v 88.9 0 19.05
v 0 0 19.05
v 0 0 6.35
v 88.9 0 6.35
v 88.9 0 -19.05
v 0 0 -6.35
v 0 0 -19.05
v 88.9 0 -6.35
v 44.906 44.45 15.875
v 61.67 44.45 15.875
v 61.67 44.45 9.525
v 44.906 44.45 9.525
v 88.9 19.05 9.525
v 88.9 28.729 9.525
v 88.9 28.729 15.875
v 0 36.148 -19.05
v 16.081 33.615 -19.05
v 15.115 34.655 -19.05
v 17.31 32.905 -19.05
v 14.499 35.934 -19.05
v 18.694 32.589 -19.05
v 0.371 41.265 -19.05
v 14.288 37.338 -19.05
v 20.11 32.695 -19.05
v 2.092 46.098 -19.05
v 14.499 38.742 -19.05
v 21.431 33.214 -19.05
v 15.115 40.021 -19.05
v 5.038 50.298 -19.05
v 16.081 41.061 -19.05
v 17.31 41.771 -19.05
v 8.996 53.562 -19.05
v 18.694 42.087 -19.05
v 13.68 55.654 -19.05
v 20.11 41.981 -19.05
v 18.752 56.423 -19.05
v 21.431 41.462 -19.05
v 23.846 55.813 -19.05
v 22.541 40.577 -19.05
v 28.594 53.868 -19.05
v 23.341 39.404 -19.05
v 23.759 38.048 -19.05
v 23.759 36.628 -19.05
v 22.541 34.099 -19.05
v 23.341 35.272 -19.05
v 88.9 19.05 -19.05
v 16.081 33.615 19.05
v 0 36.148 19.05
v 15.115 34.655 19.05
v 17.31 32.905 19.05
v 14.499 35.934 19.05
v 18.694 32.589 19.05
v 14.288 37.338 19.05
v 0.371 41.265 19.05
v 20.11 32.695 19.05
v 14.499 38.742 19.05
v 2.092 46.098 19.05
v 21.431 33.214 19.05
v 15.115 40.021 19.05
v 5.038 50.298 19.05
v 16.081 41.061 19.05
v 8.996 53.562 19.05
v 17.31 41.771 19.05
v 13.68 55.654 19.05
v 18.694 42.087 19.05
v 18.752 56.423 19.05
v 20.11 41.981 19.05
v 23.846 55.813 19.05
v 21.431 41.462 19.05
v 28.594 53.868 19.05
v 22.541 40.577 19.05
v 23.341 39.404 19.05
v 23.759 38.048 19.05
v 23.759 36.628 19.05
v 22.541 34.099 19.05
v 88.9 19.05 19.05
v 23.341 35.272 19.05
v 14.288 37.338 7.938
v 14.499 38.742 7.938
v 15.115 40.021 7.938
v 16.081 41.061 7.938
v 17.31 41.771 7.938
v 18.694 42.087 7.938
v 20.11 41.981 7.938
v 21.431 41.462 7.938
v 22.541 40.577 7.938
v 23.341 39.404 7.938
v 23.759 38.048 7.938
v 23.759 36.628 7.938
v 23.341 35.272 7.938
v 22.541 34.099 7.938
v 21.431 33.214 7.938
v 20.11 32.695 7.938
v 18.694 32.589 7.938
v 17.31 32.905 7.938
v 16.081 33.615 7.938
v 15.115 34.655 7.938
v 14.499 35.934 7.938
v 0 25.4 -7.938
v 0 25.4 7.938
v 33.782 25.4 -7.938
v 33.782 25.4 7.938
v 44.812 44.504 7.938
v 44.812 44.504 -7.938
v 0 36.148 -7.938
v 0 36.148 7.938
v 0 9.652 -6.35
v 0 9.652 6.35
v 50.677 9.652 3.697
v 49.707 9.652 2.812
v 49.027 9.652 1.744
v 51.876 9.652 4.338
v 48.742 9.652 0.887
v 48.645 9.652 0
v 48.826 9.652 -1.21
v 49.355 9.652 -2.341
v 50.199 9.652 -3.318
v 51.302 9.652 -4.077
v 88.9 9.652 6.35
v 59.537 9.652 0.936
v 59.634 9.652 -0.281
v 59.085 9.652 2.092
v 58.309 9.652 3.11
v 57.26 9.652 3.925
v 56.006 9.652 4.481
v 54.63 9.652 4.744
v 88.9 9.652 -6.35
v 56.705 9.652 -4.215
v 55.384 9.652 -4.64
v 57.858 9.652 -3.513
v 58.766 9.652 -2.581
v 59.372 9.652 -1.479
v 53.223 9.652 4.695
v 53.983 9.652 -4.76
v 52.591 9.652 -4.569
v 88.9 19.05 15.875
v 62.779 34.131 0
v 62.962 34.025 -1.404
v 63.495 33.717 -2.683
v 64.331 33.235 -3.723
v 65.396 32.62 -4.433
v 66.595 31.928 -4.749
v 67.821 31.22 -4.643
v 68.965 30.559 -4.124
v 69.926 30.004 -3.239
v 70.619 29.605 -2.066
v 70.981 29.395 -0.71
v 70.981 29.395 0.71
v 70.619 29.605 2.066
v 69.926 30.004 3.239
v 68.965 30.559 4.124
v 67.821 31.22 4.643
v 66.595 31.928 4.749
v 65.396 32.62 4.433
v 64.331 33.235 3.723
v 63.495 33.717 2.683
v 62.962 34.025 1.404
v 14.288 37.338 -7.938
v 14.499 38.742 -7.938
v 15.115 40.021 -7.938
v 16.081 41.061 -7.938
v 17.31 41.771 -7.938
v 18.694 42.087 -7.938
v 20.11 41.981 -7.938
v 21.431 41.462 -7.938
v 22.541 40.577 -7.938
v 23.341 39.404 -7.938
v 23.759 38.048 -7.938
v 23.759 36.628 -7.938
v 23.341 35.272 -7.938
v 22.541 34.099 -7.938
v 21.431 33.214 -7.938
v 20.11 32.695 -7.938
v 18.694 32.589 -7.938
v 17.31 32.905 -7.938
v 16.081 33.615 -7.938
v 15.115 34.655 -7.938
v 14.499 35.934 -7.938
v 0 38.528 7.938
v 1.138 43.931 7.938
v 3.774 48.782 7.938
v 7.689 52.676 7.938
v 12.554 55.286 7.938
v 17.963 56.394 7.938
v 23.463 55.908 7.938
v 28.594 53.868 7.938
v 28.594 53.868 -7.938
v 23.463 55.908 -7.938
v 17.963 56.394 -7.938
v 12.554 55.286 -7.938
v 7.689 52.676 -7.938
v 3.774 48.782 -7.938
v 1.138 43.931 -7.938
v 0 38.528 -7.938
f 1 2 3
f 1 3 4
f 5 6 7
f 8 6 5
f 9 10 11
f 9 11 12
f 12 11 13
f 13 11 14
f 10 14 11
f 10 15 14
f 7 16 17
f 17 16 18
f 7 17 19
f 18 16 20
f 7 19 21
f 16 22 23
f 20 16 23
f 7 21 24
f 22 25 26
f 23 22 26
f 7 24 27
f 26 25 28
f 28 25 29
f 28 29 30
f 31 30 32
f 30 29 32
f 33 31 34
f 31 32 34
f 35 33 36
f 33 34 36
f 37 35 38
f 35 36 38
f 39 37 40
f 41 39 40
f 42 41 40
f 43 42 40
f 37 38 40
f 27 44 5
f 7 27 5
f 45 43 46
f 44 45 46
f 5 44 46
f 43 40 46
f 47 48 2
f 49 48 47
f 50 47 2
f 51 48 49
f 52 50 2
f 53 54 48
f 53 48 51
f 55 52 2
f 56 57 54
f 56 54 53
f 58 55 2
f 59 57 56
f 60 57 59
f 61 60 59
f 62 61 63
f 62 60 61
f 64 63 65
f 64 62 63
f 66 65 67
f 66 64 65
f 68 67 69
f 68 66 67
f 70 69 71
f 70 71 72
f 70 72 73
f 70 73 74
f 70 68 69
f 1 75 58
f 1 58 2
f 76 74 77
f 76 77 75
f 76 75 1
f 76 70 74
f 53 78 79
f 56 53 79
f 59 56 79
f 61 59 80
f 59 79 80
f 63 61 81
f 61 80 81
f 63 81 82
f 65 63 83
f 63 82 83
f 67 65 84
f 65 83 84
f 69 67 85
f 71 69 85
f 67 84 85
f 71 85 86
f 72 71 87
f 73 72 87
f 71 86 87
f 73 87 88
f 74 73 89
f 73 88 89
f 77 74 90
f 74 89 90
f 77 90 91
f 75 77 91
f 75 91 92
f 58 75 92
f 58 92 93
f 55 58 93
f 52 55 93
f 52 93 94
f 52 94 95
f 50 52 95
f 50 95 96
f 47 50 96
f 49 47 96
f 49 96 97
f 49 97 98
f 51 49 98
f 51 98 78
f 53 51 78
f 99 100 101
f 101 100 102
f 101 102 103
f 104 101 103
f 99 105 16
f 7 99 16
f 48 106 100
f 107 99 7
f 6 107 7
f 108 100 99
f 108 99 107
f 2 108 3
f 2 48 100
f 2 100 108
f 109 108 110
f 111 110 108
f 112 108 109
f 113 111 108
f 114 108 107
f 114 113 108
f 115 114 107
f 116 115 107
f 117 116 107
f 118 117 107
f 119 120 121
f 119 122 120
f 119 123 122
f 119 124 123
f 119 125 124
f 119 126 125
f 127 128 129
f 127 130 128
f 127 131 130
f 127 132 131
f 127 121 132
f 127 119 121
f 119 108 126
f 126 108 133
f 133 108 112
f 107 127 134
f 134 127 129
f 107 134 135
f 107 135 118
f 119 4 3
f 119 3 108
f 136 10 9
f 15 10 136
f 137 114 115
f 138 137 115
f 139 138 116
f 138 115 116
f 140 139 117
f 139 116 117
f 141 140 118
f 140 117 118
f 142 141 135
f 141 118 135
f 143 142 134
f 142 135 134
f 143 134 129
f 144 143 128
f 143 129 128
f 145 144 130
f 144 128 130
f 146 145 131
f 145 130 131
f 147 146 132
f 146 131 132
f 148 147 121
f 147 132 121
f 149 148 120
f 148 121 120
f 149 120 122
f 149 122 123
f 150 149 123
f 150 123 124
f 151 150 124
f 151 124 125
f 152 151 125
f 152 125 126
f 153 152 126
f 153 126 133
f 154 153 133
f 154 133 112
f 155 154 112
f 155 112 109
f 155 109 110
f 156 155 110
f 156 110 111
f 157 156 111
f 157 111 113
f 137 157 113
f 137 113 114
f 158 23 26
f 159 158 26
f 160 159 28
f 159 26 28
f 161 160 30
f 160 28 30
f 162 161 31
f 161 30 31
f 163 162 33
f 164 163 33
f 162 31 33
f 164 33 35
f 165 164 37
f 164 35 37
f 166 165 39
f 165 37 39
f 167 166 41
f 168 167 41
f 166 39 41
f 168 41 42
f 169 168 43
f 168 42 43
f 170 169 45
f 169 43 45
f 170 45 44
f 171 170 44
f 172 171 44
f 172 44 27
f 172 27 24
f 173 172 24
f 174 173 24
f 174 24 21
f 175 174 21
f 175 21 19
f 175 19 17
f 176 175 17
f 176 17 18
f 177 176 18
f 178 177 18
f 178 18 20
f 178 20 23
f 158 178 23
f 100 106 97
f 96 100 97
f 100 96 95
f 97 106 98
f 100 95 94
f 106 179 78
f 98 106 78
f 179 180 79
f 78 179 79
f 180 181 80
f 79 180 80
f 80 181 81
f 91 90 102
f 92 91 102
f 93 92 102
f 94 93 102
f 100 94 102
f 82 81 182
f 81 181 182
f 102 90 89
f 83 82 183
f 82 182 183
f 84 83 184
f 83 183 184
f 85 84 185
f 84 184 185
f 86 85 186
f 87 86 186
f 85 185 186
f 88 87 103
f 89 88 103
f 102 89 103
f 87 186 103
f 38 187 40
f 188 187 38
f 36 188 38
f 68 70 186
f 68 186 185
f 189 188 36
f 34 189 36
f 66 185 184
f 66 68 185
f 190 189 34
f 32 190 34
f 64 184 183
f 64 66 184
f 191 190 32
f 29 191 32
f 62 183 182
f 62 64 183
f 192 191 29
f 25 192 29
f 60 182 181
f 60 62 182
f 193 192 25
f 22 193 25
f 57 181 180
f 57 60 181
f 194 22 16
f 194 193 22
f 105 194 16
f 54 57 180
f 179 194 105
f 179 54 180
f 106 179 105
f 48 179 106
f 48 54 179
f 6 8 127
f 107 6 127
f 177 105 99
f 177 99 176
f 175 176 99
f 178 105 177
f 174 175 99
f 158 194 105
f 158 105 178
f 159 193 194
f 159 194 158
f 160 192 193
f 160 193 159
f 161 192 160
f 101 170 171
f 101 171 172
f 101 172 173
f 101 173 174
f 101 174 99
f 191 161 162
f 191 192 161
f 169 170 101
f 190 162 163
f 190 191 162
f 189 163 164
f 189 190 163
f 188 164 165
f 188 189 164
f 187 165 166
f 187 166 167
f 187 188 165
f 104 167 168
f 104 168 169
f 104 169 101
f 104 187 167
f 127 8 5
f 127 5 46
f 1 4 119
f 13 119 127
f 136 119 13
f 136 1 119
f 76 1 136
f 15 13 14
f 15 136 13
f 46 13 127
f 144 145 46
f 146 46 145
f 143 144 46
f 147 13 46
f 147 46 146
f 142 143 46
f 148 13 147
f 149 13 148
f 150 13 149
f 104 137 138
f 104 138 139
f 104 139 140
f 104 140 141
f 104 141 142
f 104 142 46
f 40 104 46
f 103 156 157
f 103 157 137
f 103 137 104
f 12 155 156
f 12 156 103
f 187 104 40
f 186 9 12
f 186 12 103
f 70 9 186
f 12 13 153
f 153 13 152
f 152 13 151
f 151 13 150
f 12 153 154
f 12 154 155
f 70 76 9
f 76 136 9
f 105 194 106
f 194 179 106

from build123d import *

# Parameters (mm, degrees)
BOSS_EXTRUDE1_DEPTH          = 19.05
SKETCH2_W                    = 12.7
SKETCH2_H                    = 9.652
CUT_EXTRUDE1_DEPTH           = 108.035088344
BOSS_EXTRUDE2_DEPTH          = 3.175
CUT_EXTRUDE12_DEPTH          = 7.9375
F_1_2_0_375_DIAMETER_HOLE1_D = 9.525
F_1_2_0_375_DIAMETER_HOLE2_D = 9.525


with BuildPart() as part:
    # Sketch1 → Boss-Extrude1 (new, symmetric)
    with BuildSketch(Plane.XY):
        with BuildLine():
            Line((0, 36.148070179), (0, 0))
            Line((0, 0), (88.9, 0))
            Line((88.9, 0), (88.9, 19.05))
            Line((88.9, 19.05), (28.593563708, 53.867937227))
            ThreePointArc((28.593563708, 53.867937227), (8.995572876, 53.562269727), (0, 36.148070179))
        make_face()
    extrude(amount=BOSS_EXTRUDE1_DEPTH, both=True)

    # Sketch2 → Cut-Extrude1 (cut, through all)
    with BuildSketch(Plane(origin=(88.9, 0, 0), x_dir=(0, 0, -1), z_dir=(1, 0, 0))):
        with Locations((0, 4.826)):
            Rectangle(SKETCH2_W, SKETCH2_H)
    extrude(amount=-CUT_EXTRUDE1_DEPTH, mode=Mode.SUBTRACT)

    # Sketch3 → Boss-Extrude2 (add, symmetric)
    with BuildSketch(Plane.XY.offset(12.7)):
        Polygon((88.9, 28.728699913), (61.669909488, 44.45), (44.905909488, 44.45), (88.9, 19.05), align=None)
    extrude(amount=BOSS_EXTRUDE2_DEPTH, both=True)

    # Sketch17 → Cut-Extrude12 (cut, symmetric)
    with BuildSketch(Plane.XY):
        Polygon((0, 25.4), (33.782, 25.4), (51.929375197, 56.832175865), (0, 56.832175865), align=None)
    extrude(amount=CUT_EXTRUDE12_DEPTH, both=True, mode=Mode.SUBTRACT)

    # 1/2 (0.375) Diameter Hole1 (through all)
    with Locations(Plane(origin=(30.473891971, 52.782329198, 0), x_dir=(0.8660254037844419, -0.4999999999999945, 0), z_dir=(0.49999999999999445, 0.8660254037844418, 0))):
        with Locations((42.064658396, 0)):
            Hole(F_1_2_0_375_DIAMETER_HOLE1_D / 2)

    # 1/2 (0.375) Diameter Hole2 (through all)
    with Locations(Plane.XY.offset(19.05)):
        with Locations((19.05, 37.338)):
            Hole(F_1_2_0_375_DIAMETER_HOLE2_D / 2)


solid = part.part
